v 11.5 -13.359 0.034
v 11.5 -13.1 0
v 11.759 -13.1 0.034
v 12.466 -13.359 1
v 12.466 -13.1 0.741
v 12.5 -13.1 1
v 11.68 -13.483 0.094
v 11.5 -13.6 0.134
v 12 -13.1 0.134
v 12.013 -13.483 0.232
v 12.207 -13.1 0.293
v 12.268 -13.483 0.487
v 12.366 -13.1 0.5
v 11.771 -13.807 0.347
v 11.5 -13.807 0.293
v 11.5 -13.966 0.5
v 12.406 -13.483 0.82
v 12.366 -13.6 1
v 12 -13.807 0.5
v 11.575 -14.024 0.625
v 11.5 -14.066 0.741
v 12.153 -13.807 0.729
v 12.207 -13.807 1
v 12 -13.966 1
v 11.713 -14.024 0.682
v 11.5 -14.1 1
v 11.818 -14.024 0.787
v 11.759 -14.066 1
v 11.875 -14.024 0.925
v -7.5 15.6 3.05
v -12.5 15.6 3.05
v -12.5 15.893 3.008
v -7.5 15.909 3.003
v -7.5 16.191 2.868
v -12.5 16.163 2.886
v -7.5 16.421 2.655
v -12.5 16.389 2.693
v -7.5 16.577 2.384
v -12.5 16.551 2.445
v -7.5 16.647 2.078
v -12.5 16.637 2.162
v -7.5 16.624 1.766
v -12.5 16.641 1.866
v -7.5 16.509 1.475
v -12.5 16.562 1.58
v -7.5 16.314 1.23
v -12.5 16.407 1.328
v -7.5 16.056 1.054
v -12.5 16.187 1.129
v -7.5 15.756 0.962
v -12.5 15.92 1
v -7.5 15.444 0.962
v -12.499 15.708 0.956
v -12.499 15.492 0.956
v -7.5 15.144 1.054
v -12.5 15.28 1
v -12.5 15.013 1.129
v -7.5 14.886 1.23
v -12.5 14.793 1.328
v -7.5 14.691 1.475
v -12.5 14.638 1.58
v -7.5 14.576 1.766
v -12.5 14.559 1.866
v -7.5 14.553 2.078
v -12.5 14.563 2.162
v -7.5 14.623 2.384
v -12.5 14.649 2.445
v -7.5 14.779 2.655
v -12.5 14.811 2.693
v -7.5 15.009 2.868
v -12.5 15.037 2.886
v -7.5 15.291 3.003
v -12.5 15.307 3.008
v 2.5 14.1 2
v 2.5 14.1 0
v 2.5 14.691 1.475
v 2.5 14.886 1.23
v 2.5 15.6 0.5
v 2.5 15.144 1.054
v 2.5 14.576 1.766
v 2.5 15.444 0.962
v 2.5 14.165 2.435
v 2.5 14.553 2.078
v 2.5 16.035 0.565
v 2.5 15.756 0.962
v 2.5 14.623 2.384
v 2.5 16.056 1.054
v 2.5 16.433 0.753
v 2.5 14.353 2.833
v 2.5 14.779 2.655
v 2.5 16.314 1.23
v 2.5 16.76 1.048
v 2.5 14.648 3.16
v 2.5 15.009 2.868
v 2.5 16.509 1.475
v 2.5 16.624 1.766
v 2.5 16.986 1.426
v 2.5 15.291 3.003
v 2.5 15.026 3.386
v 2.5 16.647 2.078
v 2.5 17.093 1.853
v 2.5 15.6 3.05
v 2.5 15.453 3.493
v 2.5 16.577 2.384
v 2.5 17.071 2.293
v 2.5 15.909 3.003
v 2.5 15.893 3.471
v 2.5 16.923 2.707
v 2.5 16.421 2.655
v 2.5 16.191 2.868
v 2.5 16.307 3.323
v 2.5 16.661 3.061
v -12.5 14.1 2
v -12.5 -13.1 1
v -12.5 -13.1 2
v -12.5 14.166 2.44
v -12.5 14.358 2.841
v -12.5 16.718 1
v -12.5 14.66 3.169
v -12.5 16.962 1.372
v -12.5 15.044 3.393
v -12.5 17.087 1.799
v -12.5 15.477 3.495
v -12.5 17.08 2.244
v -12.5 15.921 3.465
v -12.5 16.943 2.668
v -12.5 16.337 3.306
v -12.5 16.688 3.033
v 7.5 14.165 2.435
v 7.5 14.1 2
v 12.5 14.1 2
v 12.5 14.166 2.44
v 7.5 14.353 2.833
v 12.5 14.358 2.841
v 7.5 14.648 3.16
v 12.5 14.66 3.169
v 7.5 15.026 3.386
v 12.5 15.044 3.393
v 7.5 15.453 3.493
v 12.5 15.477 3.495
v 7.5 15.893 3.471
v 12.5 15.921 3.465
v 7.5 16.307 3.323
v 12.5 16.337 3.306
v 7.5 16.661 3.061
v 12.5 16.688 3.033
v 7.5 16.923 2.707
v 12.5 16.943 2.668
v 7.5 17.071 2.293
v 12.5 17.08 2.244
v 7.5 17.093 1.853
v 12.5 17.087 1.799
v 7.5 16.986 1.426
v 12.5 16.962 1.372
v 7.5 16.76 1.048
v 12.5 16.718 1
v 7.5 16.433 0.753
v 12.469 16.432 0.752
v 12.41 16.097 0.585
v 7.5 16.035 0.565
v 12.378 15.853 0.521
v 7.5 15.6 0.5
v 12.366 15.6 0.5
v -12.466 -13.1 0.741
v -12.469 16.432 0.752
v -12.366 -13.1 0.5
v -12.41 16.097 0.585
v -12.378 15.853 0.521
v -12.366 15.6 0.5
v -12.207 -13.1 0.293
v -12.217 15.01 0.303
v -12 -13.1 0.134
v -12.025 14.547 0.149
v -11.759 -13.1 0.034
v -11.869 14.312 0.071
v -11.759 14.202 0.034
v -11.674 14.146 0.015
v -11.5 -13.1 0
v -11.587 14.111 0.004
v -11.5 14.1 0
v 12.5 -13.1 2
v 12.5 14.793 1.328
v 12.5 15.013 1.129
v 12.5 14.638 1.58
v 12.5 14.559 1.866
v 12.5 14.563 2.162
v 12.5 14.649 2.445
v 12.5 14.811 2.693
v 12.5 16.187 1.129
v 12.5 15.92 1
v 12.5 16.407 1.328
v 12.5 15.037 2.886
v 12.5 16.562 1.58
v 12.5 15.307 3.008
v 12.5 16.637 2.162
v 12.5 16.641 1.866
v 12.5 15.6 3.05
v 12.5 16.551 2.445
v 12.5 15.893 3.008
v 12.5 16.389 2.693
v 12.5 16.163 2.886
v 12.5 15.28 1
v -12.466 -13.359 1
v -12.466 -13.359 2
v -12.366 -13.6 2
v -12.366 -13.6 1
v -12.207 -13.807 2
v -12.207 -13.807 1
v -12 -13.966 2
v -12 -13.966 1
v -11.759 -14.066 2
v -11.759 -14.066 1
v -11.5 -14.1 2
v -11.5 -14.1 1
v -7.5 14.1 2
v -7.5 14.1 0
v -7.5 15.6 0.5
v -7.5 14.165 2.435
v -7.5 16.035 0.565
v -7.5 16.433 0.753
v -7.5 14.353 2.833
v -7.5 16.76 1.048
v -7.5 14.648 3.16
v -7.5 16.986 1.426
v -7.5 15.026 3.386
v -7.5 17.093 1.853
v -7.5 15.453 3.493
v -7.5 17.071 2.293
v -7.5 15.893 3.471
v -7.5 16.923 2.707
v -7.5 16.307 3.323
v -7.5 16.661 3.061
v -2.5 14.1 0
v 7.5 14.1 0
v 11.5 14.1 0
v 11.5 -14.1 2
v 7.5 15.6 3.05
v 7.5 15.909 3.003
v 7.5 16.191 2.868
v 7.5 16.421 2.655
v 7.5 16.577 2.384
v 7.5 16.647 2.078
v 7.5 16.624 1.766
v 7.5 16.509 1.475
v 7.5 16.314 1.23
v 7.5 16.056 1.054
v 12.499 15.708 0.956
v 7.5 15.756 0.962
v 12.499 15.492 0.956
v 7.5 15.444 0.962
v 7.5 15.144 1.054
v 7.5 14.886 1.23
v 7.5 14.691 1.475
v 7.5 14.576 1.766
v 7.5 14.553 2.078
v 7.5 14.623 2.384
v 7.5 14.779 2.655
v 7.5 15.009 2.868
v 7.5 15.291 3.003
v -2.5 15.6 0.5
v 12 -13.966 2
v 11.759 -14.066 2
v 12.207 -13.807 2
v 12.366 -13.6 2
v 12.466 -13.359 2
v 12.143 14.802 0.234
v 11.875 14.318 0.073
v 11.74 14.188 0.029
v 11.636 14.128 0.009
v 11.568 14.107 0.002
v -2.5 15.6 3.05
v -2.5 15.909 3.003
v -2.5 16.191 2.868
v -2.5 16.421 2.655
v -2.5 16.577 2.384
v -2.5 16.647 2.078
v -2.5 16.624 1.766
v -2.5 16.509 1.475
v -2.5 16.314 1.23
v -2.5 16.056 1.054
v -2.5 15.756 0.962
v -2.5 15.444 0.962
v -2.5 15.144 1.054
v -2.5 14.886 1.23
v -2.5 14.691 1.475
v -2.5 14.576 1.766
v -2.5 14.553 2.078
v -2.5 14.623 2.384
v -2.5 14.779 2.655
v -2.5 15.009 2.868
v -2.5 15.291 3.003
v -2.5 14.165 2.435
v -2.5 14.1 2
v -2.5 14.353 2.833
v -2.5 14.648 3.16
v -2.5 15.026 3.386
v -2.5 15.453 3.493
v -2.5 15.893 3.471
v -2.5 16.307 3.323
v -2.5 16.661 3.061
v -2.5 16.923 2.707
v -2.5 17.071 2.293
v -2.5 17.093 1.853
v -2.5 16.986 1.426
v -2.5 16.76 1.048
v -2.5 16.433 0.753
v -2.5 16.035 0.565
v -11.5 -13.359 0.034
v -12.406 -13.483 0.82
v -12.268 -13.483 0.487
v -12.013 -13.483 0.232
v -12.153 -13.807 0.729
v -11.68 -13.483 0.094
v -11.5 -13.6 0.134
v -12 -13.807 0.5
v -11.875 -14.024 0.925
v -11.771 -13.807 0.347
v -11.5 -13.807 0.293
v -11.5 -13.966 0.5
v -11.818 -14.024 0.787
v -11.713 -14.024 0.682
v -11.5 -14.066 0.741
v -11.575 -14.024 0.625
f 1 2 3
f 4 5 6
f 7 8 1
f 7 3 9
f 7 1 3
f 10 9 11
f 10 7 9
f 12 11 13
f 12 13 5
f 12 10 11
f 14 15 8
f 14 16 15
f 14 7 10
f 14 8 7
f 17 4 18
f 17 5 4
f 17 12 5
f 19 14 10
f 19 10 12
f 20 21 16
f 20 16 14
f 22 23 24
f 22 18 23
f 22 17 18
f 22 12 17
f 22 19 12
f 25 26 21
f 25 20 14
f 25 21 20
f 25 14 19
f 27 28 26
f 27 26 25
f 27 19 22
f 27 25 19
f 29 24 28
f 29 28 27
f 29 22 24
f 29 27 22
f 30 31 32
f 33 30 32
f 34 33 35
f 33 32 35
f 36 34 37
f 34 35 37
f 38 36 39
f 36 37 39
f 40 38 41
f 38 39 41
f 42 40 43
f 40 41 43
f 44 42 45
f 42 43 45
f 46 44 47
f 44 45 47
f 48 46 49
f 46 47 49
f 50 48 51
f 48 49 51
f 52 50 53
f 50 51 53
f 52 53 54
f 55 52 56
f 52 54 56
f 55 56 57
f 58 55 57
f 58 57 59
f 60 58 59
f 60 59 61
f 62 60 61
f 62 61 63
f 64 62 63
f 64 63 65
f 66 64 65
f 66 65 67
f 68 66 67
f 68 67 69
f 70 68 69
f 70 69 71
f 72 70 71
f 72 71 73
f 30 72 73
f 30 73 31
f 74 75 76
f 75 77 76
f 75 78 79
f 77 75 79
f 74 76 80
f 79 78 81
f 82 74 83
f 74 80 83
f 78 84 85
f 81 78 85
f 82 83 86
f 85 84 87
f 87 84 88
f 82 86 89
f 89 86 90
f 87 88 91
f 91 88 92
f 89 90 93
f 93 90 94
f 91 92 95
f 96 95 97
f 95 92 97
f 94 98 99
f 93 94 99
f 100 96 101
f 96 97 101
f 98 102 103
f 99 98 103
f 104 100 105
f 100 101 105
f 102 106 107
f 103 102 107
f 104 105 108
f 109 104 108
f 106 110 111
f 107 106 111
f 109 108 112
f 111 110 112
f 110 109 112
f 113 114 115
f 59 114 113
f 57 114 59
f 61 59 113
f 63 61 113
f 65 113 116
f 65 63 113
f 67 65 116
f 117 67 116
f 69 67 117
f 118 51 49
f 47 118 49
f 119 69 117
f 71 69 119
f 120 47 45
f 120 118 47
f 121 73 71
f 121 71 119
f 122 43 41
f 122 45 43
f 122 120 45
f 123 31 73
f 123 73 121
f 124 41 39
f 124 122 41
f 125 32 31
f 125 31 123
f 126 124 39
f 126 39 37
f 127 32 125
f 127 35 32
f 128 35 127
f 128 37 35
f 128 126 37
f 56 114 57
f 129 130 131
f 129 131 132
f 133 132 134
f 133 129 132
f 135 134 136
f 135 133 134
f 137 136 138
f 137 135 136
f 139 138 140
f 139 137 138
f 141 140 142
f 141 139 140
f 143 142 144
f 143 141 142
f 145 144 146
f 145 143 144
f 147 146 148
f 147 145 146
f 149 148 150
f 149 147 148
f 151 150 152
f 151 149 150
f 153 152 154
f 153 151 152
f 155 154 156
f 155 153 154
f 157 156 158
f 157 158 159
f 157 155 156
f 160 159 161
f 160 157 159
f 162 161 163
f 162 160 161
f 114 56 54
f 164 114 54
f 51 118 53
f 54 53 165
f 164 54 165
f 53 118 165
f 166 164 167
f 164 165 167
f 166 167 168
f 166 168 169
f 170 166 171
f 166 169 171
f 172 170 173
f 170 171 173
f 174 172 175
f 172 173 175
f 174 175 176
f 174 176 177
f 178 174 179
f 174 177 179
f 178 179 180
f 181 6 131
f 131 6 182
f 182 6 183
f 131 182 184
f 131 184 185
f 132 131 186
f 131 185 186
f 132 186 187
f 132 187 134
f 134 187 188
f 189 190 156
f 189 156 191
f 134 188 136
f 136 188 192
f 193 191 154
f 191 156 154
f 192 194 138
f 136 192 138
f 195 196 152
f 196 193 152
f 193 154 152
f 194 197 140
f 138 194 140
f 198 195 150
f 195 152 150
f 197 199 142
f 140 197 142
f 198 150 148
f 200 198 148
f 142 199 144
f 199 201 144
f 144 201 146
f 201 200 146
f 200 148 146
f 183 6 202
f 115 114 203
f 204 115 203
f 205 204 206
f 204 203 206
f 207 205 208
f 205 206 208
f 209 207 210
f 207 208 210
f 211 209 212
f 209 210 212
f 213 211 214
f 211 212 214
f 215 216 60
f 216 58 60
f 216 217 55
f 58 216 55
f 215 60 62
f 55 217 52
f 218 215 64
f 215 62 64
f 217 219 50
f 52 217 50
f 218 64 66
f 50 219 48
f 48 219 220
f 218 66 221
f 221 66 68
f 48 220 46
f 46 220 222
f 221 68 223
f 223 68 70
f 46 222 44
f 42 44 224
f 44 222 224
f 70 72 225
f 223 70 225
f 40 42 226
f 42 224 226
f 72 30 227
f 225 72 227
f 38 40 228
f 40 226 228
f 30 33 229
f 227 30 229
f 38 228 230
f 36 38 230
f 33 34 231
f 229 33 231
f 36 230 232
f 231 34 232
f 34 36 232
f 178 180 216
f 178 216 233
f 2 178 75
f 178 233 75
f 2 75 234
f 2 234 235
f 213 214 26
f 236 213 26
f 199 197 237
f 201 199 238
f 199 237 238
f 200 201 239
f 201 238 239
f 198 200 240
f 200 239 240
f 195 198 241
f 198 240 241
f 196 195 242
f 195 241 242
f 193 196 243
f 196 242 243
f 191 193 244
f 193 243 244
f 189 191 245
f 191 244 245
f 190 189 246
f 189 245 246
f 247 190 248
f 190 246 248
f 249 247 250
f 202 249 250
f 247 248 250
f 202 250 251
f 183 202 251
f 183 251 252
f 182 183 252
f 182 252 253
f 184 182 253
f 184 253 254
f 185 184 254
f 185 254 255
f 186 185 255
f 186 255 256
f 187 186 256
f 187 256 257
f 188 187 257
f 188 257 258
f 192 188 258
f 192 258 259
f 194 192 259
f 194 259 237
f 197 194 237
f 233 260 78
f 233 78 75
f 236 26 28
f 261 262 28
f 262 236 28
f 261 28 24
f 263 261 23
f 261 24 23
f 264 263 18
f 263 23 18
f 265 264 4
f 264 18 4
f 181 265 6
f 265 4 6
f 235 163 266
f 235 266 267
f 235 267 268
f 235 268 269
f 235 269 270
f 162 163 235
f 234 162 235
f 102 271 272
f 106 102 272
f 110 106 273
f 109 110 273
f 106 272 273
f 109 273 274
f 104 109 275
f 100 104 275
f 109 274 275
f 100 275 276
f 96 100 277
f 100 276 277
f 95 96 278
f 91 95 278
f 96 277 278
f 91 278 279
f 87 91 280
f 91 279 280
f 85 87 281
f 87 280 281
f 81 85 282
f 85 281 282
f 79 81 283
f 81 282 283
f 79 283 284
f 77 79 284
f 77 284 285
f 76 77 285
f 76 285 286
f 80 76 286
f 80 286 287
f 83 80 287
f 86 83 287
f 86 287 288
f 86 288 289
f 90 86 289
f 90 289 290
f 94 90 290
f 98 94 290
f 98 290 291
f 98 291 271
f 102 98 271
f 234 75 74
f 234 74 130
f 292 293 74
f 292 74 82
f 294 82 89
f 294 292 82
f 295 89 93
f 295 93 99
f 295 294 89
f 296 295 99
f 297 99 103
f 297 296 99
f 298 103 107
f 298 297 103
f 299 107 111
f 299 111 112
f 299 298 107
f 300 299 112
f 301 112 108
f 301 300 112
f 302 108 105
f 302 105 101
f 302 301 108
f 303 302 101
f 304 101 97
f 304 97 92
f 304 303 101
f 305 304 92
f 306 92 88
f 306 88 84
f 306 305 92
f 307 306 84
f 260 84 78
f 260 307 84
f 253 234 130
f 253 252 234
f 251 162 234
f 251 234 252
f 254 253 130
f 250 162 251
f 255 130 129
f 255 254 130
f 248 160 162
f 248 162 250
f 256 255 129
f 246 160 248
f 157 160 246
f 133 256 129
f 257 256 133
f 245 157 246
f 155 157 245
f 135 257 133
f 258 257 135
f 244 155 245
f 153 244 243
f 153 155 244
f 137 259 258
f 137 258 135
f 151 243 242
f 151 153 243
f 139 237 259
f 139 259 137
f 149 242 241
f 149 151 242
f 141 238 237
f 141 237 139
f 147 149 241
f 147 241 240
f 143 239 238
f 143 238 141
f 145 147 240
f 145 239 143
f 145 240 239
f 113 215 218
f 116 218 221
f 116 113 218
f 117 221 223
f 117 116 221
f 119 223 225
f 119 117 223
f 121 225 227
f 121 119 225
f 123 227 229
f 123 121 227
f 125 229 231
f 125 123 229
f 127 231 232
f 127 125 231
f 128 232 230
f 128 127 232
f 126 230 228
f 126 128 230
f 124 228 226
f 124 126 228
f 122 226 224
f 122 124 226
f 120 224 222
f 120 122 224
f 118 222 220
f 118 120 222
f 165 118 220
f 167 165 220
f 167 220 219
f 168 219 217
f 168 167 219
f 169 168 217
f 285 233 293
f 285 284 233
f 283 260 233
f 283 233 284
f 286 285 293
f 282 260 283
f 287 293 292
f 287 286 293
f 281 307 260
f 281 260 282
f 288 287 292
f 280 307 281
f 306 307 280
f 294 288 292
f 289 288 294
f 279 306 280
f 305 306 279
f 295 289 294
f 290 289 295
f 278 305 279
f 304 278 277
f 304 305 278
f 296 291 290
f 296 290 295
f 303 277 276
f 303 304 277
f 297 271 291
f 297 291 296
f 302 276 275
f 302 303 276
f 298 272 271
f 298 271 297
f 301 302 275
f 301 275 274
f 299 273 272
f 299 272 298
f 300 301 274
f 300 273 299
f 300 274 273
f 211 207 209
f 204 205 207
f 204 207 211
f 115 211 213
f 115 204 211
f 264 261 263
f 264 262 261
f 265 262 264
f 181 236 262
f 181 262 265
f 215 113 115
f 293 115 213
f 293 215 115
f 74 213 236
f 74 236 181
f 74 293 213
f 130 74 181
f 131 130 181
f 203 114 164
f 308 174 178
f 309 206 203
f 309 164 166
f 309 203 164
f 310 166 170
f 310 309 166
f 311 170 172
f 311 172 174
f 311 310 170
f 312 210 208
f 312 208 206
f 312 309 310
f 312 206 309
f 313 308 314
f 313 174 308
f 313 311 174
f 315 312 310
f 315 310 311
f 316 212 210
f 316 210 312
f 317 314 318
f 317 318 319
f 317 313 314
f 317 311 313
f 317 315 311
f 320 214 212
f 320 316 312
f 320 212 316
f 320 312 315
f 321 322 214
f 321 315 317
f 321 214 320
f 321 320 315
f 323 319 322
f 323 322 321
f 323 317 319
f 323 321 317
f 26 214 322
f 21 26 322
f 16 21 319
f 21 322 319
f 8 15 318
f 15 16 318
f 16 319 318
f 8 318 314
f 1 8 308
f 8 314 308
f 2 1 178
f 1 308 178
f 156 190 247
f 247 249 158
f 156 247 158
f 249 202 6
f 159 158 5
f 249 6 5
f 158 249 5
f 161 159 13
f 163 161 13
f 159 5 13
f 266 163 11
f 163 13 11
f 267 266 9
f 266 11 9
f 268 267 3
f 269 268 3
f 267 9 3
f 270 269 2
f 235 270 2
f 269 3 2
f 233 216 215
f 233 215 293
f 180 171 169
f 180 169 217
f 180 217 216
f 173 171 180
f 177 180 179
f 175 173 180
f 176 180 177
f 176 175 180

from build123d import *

# Parameters (mm, degrees)
SKETCH1_W           = 25
SKETCH1_H           = 28.2
BOSS_EXTRUDE1_DEPTH = 2
BOSS_EXTRUDE2_DEPTH = 5
LPATTERN1_COUNT     = 3
LPATTERN1_PITCH     = 10
SKETCH6_R           = 1.050000034
CUT_EXTRUDE1_DEPTH  = 31.490326335
FILLET1_R           = 1
FILLET2_R           = 1


with BuildPart() as part:
    # Sketch1 → Boss-Extrude1 (new body)
    with BuildSketch(Plane.XY):
        Rectangle(SKETCH1_W, SKETCH1_H)
    extrude(amount=BOSS_EXTRUDE1_DEPTH)

    # Sketch5 → Boss-Extrude2 (add)
    with BuildSketch(Plane.ZY.offset(12.5)):
        with BuildLine():
            Line((0.5, 15.6), (0, 14.1))
            Line((0, 14.1), (2, 14.1))
            ThreePointArc((2, 14.1), (3.060660172, 16.660660172), (0.5, 15.6))
        make_face()
    boss_extrude2 = extrude(amount=-BOSS_EXTRUDE2_DEPTH)

    # LPattern1: Boss-Extrude2 ×3
    with Locations(*[(i * LPATTERN1_PITCH, 0, 0) for i in range(1, LPATTERN1_COUNT)]):
        add(boss_extrude2)

    # Sketch6 → Cut-Extrude1 (cut, through all)
    with BuildSketch(Plane.ZY.offset(12.5)):
        with Locations((2, 15.6)):
            Circle(SKETCH6_R)
    extrude(amount=-CUT_EXTRUDE1_DEPTH, mode=Mode.SUBTRACT)

    # Fillet1
    # the kernel refuses this fillet: 1 mm, written as the material it takes off along each edge
    with BuildSketch(Plane(origin=(12.5, -20.1, 0), x_dir=(0, 0, 1), z_dir=(0, 1, 0)), Plane(origin=(-12.5, 20.1, 0), x_dir=(0, 0, 1), z_dir=(0, -1, 0))) as fillet1_piece_1:
        with BuildLine():
            CenterArc((FILLET1_R, -FILLET1_R), FILLET1_R, 90, 90)
            Line((0, -FILLET1_R), (-FILLET1_R * 0.02, -FILLET1_R))
            Line((-FILLET1_R * 0.02, -FILLET1_R), (-FILLET1_R * 0.02, FILLET1_R * 0.02))
            Line((-FILLET1_R * 0.02, FILLET1_R * 0.02), (FILLET1_R, FILLET1_R * 0.02))
            Line((FILLET1_R, FILLET1_R * 0.02), (FILLET1_R, 0))
        make_face()
    extrude(amount=40.2, mode=Mode.SUBTRACT)
    with BuildSketch(Plane(origin=(-18.5, -14.1, 0), x_dir=(0, 0, 1), z_dir=(1, 0, 0))) as fillet1_piece_2:
        with BuildLine():
            CenterArc((FILLET1_R, -FILLET1_R), FILLET1_R, 90, 90)
            Line((0, -FILLET1_R), (-FILLET1_R * 0.02, -FILLET1_R))
            Line((-FILLET1_R * 0.02, -FILLET1_R), (-FILLET1_R * 0.02, FILLET1_R * 0.02))
            Line((-FILLET1_R * 0.02, FILLET1_R * 0.02), (FILLET1_R, FILLET1_R * 0.02))
            Line((FILLET1_R, FILLET1_R * 0.02), (FILLET1_R, 0))
        make_face()
    extrude(amount=37, mode=Mode.SUBTRACT)

    # Fillet2
    # the kernel refuses this fillet: 1 mm, written as the material it takes off along each edge
    with BuildSketch(Plane(origin=(-11.5, -13.1, 1), x_dir=(-1, 0, 0), z_dir=(0, -1, 0))) as fillet2_piece_1_section:
        Polygon((0, 0), (FILLET2_R, 0), (FILLET2_R, FILLET2_R), (0, FILLET2_R), align=None)
    fillet2_piece_1 = extrude(amount=FILLET2_R, mode=Mode.PRIVATE)
    fillet2_piece_1 = fillet2_piece_1 - Plane(origin=(-11.5, -13.1, 1), x_dir=(0.7071067811865475, 0, 0.7071067811865475), z_dir=(0, -1, 0)) * Sphere(FILLET2_R, mode=Mode.PRIVATE)
    add(fillet2_piece_1, mode=Mode.SUBTRACT)
    with BuildSketch(Plane(origin=(11.5, -13.1, 1), x_dir=(1, 0, 0), z_dir=(0, -1, 0))) as fillet2_piece_2_section:
        Polygon((0, 0), (FILLET2_R, 0), (FILLET2_R, -FILLET2_R), (0, -FILLET2_R), align=None)
    fillet2_piece_2 = extrude(amount=FILLET2_R, mode=Mode.PRIVATE)
    fillet2_piece_2 = fillet2_piece_2 - Plane(origin=(11.5, -13.1, 1), x_dir=(-0.7071067811865475, 0, 0.7071067811865475), z_dir=(0, -1, 0)) * Sphere(FILLET2_R, mode=Mode.PRIVATE)
    add(fillet2_piece_2, mode=Mode.SUBTRACT)
    with BuildSketch(Plane(origin=(12.5, -14.1, 1), x_dir=(-1, 0, 0), z_dir=(0, 0, 1))) as fillet2_piece_3:
        with BuildLine():
            CenterArc((FILLET2_R, -FILLET2_R), FILLET2_R, 90, 90)
            Line((0, -FILLET2_R), (0, 0))
            Line((0, 0), (FILLET2_R, 0))
        make_face()
    extrude(amount=3.5, mode=Mode.SUBTRACT)
    with BuildSketch(Plane(origin=(-12.5, -14.1, 1), x_dir=(1, 0, 0), z_dir=(0, 0, 1))) as fillet2_piece_4:
        with BuildLine():
            CenterArc((FILLET2_R, FILLET2_R), FILLET2_R, 180, 90)
            Line((0, FILLET2_R), (0, 0))
            Line((0, 0), (FILLET2_R, 0))
        make_face()
    extrude(amount=3.5, mode=Mode.SUBTRACT)


solid = part.part
